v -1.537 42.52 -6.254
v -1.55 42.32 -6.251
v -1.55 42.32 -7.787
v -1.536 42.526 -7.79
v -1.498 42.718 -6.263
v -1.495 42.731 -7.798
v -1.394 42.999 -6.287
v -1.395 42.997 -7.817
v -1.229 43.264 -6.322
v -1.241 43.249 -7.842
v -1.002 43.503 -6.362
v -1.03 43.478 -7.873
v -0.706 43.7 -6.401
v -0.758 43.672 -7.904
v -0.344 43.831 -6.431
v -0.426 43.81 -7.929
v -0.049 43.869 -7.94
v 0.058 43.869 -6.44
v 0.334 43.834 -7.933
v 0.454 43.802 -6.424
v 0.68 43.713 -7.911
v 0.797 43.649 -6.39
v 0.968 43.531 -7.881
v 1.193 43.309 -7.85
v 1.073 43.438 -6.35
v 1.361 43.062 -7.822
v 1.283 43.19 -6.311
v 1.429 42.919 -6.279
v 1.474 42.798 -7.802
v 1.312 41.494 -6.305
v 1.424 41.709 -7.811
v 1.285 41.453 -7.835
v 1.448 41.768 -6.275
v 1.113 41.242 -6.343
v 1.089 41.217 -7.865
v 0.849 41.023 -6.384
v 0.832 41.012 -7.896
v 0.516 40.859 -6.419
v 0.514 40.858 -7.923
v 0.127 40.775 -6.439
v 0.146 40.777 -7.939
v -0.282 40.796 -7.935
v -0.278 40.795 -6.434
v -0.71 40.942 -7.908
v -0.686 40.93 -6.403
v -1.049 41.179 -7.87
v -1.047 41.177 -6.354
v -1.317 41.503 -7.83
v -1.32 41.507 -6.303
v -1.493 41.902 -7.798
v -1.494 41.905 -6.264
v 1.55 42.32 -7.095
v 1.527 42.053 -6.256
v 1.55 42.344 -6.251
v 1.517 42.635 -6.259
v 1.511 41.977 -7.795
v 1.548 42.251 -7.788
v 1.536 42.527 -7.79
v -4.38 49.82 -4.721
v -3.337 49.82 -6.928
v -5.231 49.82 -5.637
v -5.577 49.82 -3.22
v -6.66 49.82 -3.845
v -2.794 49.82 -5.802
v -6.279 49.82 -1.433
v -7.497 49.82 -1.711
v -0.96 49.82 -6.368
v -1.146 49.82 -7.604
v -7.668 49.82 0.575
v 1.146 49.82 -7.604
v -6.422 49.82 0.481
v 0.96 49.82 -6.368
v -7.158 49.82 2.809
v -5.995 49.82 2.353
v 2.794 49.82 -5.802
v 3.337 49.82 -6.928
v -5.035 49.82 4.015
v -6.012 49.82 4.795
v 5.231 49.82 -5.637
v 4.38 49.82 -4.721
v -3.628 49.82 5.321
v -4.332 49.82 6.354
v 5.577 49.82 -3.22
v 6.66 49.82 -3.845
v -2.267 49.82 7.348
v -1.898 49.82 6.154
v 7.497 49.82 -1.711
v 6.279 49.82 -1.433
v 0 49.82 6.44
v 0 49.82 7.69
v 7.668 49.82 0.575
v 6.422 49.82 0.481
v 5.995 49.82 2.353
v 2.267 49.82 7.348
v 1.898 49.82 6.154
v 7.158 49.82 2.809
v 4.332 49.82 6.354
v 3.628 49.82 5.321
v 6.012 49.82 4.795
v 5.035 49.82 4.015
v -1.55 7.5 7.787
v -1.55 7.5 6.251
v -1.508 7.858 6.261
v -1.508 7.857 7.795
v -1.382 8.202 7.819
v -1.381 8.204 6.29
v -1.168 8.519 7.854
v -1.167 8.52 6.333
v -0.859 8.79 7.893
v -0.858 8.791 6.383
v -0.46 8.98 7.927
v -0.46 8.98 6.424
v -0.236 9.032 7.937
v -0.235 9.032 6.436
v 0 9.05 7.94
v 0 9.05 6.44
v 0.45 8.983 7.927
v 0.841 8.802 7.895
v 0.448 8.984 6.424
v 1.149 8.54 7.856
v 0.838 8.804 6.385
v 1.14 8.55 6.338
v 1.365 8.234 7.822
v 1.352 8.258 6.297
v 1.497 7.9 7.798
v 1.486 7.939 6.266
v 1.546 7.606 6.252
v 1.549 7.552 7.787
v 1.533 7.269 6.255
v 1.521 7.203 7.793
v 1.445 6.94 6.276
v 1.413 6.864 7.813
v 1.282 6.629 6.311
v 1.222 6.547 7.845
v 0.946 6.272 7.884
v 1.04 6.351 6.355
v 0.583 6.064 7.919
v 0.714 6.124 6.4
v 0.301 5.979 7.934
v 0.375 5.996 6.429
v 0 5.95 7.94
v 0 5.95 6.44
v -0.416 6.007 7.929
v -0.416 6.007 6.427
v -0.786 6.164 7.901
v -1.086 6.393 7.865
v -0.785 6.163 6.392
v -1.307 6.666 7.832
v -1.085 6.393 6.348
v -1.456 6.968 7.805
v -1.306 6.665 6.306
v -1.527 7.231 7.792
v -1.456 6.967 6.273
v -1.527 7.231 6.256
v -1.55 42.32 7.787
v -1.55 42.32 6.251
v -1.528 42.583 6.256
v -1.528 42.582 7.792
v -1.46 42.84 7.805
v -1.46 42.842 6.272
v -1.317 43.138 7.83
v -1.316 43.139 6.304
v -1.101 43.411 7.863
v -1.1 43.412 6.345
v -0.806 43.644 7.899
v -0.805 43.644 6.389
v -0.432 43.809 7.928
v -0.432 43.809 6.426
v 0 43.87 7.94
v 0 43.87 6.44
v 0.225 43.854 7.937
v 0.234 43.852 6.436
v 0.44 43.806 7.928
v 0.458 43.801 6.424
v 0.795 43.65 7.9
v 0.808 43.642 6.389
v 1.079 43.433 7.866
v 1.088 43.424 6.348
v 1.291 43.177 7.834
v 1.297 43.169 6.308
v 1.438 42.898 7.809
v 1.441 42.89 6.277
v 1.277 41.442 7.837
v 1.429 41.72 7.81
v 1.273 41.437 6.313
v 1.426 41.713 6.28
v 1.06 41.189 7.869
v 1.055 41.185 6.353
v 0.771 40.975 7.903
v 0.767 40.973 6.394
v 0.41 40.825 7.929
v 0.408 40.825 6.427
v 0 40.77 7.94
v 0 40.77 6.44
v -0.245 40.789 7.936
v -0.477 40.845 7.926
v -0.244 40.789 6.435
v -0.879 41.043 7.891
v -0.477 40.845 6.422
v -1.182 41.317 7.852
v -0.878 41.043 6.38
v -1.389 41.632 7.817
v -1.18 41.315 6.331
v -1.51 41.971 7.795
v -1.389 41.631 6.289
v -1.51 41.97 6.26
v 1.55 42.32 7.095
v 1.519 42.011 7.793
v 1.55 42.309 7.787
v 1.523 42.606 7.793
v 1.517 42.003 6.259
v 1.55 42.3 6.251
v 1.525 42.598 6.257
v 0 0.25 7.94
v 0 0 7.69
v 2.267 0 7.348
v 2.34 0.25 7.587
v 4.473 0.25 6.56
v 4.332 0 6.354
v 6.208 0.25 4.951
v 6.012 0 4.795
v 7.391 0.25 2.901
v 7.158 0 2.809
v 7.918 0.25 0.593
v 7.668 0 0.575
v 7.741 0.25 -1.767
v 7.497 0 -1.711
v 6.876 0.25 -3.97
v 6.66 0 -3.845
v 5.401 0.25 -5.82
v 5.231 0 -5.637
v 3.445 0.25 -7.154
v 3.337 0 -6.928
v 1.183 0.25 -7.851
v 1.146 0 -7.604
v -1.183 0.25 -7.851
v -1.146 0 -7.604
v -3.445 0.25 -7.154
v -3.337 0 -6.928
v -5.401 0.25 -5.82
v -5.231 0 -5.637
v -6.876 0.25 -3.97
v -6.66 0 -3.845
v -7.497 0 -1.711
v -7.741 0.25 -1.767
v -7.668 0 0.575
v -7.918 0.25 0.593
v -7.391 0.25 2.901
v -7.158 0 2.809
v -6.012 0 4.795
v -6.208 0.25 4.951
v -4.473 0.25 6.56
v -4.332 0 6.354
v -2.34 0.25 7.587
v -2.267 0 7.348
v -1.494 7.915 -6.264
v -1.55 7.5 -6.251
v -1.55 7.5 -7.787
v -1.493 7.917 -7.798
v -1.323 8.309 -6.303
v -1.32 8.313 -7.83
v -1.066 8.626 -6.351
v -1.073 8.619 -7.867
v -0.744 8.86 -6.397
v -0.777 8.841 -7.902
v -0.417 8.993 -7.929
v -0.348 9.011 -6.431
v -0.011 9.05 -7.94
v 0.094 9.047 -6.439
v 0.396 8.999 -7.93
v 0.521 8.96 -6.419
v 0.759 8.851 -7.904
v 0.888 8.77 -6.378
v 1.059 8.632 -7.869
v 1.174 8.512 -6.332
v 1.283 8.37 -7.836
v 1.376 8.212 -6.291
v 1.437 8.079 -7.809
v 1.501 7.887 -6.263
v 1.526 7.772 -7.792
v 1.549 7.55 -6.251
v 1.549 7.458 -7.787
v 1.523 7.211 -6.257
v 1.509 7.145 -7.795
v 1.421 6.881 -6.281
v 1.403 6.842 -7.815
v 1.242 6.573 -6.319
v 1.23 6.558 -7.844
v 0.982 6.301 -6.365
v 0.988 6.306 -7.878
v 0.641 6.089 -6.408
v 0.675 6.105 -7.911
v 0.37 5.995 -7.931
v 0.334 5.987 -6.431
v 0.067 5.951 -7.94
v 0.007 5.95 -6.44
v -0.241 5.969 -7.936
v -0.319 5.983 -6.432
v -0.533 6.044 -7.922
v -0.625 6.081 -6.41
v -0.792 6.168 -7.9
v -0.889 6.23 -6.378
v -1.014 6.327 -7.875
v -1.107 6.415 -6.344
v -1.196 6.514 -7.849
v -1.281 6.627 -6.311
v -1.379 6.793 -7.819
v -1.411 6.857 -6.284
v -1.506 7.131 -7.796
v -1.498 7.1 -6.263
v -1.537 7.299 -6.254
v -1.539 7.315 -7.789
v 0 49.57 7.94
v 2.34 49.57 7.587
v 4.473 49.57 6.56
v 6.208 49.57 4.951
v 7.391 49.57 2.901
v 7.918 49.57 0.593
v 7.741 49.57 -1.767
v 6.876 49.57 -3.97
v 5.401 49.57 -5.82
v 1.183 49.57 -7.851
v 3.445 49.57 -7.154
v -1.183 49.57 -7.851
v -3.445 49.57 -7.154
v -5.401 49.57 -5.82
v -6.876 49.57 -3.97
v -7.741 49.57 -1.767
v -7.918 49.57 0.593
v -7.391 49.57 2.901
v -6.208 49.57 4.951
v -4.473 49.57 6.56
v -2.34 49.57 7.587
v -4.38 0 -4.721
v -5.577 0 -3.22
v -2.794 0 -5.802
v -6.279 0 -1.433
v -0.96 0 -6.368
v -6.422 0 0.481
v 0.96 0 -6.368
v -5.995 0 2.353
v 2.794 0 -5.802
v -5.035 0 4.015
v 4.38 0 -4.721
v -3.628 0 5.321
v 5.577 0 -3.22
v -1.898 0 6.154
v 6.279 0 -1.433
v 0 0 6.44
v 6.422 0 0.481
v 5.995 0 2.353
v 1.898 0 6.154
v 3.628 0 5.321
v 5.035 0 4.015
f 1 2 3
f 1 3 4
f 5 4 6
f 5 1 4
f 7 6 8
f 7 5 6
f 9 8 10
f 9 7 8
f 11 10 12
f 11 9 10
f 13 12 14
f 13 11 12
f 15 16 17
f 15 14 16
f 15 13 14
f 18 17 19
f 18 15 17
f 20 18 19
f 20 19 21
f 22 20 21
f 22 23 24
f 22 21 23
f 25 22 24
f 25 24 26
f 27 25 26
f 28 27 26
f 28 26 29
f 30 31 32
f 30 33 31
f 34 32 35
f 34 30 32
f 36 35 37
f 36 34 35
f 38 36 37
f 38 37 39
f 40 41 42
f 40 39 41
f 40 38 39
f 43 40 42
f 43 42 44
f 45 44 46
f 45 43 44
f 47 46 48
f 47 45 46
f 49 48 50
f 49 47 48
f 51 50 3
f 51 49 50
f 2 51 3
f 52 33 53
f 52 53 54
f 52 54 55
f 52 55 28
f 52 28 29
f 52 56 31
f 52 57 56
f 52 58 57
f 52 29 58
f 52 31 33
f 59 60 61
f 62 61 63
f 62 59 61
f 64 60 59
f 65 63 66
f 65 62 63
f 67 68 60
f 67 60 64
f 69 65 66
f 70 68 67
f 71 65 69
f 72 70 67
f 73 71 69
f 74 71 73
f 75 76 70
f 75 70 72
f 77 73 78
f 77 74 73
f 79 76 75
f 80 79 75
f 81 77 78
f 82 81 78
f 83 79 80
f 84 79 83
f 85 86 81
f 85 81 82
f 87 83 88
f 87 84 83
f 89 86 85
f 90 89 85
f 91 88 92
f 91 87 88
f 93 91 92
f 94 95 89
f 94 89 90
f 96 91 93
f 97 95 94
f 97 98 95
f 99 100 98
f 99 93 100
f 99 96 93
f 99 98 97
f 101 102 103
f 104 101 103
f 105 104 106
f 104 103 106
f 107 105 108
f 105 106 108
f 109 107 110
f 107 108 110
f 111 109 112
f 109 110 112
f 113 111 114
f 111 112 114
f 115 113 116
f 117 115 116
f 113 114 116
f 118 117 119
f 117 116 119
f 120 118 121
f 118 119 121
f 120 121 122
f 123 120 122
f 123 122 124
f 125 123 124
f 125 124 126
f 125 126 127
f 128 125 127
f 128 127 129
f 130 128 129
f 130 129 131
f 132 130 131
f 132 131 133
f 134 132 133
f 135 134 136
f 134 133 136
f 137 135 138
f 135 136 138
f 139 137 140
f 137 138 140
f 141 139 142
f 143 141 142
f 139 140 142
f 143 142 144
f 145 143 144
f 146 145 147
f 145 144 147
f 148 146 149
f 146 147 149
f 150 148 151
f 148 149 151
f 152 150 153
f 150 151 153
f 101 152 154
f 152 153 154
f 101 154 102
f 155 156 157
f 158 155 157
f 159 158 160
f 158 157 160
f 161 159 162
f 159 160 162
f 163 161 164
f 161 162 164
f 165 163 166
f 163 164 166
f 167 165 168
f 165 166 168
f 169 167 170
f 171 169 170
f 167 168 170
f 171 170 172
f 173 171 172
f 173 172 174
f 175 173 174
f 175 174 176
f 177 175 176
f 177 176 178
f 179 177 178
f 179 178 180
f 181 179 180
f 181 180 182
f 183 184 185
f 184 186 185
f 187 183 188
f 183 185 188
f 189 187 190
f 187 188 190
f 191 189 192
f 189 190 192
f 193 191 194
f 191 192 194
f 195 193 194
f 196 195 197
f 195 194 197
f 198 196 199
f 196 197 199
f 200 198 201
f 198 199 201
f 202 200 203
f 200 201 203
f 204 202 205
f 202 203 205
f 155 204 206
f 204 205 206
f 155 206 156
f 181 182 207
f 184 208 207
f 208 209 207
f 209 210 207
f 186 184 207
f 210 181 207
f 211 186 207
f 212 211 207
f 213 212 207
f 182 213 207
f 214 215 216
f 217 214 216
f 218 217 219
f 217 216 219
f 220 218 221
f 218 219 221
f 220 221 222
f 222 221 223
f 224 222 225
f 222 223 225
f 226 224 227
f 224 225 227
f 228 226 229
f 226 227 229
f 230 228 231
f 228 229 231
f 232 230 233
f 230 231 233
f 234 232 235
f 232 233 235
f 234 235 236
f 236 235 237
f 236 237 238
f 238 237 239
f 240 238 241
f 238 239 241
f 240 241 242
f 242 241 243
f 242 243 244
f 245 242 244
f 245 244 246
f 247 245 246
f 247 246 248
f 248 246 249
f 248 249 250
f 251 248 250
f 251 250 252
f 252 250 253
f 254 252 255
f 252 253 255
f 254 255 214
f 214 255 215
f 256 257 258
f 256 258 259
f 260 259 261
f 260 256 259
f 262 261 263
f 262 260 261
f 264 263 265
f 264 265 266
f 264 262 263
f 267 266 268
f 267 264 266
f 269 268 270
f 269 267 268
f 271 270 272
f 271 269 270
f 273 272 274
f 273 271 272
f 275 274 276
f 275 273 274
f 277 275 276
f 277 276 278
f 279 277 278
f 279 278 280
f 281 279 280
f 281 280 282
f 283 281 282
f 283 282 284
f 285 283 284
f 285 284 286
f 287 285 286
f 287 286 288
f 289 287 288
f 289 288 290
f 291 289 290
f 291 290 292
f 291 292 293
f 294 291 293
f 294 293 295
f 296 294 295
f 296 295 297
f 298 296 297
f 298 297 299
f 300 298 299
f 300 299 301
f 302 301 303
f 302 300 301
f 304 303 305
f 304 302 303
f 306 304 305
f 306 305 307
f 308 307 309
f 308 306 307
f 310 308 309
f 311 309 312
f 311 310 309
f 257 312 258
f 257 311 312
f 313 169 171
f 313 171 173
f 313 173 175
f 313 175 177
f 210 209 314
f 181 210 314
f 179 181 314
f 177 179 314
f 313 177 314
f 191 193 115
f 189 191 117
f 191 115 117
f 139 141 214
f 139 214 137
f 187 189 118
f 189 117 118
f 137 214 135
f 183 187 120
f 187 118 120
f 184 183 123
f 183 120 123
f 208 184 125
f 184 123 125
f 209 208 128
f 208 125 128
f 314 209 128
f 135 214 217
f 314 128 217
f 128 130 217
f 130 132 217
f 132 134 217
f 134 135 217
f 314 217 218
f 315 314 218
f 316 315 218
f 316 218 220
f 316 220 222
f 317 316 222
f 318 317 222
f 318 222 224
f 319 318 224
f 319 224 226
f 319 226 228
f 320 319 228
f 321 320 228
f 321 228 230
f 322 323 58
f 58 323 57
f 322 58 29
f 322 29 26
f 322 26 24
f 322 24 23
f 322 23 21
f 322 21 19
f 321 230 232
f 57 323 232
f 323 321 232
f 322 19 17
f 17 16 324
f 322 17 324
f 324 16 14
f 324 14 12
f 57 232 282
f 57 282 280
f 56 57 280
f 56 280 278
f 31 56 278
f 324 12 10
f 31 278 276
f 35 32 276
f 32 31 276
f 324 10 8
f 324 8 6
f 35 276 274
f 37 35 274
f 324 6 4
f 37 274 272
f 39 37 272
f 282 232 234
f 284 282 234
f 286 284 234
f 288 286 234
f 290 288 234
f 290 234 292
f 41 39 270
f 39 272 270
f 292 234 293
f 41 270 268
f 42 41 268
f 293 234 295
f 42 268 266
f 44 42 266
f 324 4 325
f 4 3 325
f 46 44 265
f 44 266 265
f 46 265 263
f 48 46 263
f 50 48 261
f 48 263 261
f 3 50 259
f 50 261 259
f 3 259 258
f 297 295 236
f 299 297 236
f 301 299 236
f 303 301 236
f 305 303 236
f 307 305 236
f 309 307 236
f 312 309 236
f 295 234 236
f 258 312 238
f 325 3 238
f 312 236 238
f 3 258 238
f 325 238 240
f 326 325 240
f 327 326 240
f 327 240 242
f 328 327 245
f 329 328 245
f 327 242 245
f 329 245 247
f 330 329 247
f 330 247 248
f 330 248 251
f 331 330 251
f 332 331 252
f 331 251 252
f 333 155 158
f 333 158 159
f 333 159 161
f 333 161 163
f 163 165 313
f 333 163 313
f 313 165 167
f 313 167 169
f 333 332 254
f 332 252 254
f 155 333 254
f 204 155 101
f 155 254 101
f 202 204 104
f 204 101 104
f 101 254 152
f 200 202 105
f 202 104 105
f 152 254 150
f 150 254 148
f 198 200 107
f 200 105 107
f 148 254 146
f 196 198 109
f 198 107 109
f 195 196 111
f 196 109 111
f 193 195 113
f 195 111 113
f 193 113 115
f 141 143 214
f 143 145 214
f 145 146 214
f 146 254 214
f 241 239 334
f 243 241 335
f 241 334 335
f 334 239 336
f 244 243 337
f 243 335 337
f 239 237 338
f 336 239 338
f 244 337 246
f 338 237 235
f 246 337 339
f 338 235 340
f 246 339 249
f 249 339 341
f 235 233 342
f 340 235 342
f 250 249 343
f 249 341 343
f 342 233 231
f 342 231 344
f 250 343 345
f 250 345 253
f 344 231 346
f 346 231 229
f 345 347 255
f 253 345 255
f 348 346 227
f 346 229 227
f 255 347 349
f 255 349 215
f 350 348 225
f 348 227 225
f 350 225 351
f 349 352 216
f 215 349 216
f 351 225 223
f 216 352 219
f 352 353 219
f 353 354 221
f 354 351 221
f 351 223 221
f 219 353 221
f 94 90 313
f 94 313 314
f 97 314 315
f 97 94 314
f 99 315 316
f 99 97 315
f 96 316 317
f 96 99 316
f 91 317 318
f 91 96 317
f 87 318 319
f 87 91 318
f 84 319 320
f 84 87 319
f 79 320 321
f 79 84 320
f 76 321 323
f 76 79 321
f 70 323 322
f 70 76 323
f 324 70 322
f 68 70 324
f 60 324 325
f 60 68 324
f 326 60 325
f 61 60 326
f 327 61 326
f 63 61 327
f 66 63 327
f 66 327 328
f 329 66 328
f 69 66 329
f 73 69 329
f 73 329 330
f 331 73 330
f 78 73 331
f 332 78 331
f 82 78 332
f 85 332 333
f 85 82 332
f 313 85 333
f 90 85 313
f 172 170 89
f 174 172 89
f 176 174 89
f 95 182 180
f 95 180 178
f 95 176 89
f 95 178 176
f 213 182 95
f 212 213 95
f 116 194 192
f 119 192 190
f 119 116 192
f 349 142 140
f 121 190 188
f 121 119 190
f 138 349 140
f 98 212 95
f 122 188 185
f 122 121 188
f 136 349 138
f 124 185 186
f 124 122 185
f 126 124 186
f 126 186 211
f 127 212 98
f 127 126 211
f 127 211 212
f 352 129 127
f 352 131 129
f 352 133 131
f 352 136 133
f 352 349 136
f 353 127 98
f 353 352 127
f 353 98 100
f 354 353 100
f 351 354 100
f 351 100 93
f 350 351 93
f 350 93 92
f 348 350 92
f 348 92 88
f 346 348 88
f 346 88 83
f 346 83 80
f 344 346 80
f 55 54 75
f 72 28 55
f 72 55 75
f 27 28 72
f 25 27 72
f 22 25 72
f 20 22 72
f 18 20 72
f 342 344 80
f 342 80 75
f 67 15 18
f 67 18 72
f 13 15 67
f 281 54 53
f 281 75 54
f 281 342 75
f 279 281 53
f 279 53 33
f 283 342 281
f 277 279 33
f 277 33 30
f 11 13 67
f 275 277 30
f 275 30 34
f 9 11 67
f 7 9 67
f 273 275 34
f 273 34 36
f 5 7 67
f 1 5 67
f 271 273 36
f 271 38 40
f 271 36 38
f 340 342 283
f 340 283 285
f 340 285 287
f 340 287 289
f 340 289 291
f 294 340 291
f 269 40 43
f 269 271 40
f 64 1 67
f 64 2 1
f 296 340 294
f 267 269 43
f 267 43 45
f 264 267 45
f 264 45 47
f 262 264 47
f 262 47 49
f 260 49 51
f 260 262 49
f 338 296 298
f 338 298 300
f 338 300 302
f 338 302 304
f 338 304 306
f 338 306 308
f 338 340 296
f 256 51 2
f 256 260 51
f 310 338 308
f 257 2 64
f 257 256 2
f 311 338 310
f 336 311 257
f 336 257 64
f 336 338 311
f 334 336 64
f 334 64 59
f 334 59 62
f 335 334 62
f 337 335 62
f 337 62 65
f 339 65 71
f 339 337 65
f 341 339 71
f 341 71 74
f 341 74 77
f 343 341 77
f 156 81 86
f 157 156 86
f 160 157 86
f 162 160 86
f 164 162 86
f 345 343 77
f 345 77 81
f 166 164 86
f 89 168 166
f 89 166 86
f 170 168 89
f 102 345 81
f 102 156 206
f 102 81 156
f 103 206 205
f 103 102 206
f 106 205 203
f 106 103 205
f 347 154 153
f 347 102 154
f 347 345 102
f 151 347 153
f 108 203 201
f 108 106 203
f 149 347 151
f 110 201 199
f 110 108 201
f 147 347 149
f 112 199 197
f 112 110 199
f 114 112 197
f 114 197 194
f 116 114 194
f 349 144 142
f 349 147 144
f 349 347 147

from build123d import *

# Parameters (mm, degrees)
SKETCH1_R               = 7.94
SKETCH1_R_2             = 6.44
BOSS_EXTRUDE1_DEPTH     = 49.82
CHAMFER1_SIZE           = 0.25
SKETCH2_R               = 1.55
CUT_EXTRUDE1_DEPTH      = 53.299522942
CUT_EXTRUDE1_DEPTH_BACK = 53.299522942


with BuildPart() as part:
    # Sketch1 → Boss-Extrude1 (new body)
    with BuildSketch(Plane(origin=(0, 0, 0), x_dir=(1, 0, 0), z_dir=(0, 1, 0))):
        with Locations(Location((0, 0, 0), (0, 0, 270))):
            Circle(SKETCH1_R)
        with Locations(Location((0, 0, 0), (0, 0, 270))):
            Circle(SKETCH1_R_2, mode=Mode.SUBTRACT)
    extrude(amount=BOSS_EXTRUDE1_DEPTH)

    # Chamfer1
    chamfer1_edges = [part.edges().sort_by_distance(p)[0] for p in [
        (0, 0, -7.94),
        (0, 49.82, -7.94),
    ]]
    chamfer(chamfer1_edges, length=CHAMFER1_SIZE)

    # Sketch2 → Cut-Extrude1 (cut, two sides)
    with BuildSketch(Plane(origin=(0, 0, -5.85), x_dir=(-1, 0, 0), z_dir=(0, 0, -1))) as cut_extrude1_sk:
        with Locations((0.000190227, 7.5)):
            Circle(SKETCH2_R)
        with BuildLine():
            add(Edge.make_bspline(
                [(1.550190227, 42.32), (1.550190227, 45.42), (-1.549809773, 45.42), (-1.549809773, 42.32), (-1.549809773, 39.22), (1.550190227, 39.22), (1.550190227, 42.32)],
                knots=[0, 0, 0, 0, 0.5, 0.5, 0.5, 1, 1, 1, 1], degree=3, weights=[1, 0.333333333, 0.333333333, 1, 0.333333333, 0.333333333, 1]))
        make_face()
    extrude(amount=CUT_EXTRUDE1_DEPTH, mode=Mode.SUBTRACT)
    extrude(cut_extrude1_sk.sketch, amount=-CUT_EXTRUDE1_DEPTH_BACK, mode=Mode.SUBTRACT)


solid = part.part
